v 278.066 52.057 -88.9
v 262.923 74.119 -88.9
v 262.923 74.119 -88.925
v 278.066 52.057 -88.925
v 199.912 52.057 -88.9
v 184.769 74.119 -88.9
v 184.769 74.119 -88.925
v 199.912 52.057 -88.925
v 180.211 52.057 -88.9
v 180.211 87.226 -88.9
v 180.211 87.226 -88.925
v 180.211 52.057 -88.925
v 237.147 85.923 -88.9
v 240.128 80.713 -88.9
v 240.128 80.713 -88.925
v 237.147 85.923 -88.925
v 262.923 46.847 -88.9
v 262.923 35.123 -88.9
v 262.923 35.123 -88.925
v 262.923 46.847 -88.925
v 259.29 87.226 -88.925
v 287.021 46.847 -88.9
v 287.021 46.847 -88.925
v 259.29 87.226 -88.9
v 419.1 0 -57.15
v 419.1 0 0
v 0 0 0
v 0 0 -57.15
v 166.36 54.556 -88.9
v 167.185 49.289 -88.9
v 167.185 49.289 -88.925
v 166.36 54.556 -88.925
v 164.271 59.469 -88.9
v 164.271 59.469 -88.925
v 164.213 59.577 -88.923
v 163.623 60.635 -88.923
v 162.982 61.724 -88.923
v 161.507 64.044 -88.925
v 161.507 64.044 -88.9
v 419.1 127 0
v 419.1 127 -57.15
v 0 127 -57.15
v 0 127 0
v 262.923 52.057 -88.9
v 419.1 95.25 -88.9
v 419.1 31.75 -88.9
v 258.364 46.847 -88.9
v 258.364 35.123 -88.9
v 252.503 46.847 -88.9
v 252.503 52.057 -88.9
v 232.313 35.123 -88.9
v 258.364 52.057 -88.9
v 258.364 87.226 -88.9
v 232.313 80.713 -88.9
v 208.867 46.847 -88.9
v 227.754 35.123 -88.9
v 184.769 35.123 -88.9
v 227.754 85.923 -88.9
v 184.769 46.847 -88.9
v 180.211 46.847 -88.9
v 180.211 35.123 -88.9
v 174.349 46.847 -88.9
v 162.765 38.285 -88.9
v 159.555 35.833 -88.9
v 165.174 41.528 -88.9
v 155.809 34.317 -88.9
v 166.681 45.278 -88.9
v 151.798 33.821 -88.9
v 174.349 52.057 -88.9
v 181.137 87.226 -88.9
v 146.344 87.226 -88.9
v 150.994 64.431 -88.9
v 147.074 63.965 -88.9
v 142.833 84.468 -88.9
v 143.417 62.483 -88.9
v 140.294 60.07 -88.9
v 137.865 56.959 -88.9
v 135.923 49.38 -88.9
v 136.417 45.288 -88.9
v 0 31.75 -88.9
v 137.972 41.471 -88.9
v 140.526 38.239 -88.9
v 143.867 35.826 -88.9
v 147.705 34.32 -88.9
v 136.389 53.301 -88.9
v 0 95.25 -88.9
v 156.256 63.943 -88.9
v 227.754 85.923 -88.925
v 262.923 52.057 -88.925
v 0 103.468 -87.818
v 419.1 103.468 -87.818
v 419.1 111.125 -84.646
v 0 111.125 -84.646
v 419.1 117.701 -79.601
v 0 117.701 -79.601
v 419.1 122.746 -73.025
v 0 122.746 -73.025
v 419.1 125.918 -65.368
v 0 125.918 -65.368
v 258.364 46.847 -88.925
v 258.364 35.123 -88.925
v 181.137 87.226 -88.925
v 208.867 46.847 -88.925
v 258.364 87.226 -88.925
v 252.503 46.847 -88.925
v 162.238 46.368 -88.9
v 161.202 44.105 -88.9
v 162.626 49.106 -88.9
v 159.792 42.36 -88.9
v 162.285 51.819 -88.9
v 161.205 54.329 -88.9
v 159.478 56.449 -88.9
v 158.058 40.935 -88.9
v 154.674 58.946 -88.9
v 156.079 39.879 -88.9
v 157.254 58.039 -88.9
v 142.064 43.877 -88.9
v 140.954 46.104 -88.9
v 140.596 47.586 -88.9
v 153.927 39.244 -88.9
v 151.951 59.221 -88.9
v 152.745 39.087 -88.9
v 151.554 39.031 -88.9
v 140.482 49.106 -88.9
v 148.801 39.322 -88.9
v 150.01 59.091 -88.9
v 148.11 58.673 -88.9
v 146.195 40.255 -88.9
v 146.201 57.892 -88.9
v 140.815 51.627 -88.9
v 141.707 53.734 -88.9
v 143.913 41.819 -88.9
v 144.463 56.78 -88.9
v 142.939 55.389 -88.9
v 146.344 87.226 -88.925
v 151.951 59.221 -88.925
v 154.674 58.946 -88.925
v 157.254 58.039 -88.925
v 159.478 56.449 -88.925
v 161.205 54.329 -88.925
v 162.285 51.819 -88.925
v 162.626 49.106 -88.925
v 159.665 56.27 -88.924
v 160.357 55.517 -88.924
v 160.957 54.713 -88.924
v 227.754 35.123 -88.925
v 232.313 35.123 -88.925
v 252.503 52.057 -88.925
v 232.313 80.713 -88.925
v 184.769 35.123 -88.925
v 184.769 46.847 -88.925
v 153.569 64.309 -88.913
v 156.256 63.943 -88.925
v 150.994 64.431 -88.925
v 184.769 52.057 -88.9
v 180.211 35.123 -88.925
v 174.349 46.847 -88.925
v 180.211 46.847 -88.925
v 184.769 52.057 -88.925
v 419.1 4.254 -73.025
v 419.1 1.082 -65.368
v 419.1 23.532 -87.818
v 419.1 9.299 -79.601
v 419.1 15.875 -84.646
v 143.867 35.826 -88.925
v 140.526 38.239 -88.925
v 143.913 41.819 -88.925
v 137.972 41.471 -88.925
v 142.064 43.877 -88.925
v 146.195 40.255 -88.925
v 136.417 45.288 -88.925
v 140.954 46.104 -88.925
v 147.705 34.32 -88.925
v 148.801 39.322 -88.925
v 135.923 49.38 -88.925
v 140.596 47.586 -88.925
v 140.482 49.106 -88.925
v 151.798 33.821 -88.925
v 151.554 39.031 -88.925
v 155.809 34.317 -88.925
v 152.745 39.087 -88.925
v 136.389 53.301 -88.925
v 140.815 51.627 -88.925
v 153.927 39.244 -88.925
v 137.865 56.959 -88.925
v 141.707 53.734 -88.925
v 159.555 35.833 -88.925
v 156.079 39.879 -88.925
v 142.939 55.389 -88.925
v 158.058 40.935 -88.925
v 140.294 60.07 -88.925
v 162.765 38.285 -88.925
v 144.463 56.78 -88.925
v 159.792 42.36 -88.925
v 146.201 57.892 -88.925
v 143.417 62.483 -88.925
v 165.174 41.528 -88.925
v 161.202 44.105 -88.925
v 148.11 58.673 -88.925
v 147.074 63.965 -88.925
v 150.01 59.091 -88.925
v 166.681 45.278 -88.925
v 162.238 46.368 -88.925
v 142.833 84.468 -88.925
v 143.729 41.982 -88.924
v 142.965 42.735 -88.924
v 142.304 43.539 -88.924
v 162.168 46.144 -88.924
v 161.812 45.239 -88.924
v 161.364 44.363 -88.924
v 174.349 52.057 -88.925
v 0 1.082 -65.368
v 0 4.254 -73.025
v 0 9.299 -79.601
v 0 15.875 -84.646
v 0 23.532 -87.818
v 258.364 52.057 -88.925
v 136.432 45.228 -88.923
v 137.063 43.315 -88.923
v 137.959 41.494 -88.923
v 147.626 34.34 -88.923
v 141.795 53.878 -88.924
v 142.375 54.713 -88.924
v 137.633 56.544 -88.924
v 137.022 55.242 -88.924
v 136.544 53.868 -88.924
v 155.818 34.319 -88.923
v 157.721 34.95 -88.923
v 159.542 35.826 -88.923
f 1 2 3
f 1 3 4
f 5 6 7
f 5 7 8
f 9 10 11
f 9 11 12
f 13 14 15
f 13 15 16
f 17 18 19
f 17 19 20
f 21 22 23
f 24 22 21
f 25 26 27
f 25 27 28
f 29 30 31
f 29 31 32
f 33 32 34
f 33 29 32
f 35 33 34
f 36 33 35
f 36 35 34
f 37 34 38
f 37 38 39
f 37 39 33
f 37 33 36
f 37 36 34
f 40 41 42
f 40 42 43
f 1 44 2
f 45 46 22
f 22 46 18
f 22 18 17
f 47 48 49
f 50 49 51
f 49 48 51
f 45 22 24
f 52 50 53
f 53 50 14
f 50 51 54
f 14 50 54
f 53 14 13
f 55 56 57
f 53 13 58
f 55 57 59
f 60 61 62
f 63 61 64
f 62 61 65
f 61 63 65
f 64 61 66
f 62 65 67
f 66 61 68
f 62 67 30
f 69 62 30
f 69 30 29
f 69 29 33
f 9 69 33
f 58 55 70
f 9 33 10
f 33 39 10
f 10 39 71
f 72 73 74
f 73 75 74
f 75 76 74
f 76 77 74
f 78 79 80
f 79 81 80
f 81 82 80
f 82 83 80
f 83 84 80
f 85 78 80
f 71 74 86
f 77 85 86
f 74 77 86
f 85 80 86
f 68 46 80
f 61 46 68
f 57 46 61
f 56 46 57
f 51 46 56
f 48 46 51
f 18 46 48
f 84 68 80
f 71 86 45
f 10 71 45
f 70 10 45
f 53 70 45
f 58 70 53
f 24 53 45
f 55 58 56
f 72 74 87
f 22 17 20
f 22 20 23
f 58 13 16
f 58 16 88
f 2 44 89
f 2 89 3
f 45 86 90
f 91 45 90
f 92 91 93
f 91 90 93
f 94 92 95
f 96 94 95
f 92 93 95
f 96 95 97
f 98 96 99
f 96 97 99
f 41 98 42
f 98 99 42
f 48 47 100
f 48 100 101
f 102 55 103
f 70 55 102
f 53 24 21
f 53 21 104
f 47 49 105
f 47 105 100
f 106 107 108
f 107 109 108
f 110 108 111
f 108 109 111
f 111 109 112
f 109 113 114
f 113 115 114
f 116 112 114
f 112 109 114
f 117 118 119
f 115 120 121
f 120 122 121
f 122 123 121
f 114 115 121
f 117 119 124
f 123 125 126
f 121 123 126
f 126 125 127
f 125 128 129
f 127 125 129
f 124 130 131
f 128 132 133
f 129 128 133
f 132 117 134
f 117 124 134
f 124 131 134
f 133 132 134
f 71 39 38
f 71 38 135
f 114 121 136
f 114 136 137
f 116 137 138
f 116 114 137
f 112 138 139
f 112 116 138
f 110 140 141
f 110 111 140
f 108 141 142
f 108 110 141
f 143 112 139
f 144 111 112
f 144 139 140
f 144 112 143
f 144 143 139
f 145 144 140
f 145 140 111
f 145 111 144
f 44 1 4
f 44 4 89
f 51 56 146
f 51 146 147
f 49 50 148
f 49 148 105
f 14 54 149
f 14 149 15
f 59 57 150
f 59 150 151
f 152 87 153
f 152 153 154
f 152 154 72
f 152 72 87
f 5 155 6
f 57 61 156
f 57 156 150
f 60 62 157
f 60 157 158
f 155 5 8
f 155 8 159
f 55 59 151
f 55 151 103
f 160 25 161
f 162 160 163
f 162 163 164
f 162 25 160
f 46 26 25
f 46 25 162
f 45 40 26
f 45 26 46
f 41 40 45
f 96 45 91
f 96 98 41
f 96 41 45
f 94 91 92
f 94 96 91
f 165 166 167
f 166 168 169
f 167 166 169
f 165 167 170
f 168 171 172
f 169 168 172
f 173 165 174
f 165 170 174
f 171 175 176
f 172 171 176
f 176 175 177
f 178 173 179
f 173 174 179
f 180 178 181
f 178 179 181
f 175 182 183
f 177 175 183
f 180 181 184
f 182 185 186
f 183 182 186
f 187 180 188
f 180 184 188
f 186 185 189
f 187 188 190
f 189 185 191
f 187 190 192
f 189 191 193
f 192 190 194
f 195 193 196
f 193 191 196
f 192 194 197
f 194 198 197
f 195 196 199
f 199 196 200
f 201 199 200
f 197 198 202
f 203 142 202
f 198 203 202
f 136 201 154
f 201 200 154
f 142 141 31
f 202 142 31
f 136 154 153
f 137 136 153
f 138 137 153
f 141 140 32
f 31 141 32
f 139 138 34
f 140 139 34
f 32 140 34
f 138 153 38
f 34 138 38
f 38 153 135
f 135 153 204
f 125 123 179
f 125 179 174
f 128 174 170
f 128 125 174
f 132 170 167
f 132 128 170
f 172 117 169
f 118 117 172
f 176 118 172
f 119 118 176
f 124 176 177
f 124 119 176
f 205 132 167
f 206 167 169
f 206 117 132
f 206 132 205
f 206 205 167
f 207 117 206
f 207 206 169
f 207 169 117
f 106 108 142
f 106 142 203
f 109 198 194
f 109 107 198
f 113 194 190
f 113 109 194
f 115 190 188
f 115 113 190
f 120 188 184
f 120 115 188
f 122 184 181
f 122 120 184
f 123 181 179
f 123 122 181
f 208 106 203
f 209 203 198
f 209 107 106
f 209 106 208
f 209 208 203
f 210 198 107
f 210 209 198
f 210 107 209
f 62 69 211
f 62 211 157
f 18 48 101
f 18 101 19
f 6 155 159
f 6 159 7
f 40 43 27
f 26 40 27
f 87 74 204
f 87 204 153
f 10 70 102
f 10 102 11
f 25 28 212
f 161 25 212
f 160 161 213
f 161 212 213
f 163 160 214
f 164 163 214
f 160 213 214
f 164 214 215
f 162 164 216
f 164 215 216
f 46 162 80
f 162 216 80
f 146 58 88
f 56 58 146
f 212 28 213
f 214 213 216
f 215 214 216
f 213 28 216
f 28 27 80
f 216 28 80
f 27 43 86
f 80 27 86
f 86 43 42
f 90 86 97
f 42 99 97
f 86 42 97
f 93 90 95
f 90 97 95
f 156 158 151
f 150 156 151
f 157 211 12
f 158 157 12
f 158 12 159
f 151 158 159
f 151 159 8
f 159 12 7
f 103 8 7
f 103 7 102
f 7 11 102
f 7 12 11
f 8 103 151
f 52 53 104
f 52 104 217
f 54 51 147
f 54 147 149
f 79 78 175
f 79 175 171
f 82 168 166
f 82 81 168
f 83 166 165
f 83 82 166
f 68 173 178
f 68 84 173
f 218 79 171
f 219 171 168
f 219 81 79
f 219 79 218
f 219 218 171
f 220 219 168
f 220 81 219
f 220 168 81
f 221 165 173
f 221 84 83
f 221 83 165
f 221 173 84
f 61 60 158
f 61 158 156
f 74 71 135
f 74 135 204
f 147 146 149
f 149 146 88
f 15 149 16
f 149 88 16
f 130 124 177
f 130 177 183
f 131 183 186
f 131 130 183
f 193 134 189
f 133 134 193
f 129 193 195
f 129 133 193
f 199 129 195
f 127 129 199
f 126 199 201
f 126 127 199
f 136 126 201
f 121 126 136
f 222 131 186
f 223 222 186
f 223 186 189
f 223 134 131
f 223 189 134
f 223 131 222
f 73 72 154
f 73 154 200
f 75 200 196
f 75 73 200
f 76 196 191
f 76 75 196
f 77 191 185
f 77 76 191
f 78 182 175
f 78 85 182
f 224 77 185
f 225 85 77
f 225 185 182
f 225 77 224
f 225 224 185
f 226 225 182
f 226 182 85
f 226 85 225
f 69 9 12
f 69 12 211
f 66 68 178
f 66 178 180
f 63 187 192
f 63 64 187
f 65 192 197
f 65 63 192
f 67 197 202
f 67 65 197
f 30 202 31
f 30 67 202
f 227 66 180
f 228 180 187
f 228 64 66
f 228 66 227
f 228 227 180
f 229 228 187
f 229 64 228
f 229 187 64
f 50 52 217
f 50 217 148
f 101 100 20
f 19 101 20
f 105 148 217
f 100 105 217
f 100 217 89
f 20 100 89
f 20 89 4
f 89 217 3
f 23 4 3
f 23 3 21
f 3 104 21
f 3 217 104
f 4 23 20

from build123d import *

# Parameters (mm, degrees)
BOSS_EXTRUDE1_DEPTH = 419.1
BOSS_EXTRUDE2_DEPTH = 0.0254


with BuildPart() as part:
    # Sketch1 → Boss-Extrude1 (new body)
    with BuildSketch(Plane(origin=(0, 0, 0), x_dir=(0, 0, -1), z_dir=(1, 0, 0))):
        with BuildLine():
            Line((0, 0), (57.15, 0))
            ThreePointArc((57.15, 0), (79.600640303, 9.299359697), (88.9, 31.75))
            Line((88.9, 31.75), (88.9, 95.25))
            ThreePointArc((88.9, 95.25), (79.600640303, 117.700640303), (57.15, 127))
            Line((57.15, 127), (0, 127))
            Line((0, 127), (0, 0))
        make_face()
    extrude(amount=BOSS_EXTRUDE1_DEPTH)

    # Sketch2 → Boss-Extrude2 (add)
    # profile 1 of 4: a face of its own
    with BuildSketch(Plane(origin=(0, 0, -88.9), x_dir=(-1, 0, 0), z_dir=(0, 0, -1))):
        Polygon((-259.290402428, 87.225987453), (-258.364360761, 87.225987453), (-258.364360761, 52.056756684), (-252.5028223, 52.056756684), (-252.5028223, 46.846500274), (-258.364360761, 46.846500274), (-258.364360761, 35.123423351), (-262.92333512, 35.123423351), (-262.92333512, 46.846500274), (-287.020771018, 46.846500274), align=None)
        Polygon((-262.92333512, 52.056756684), (-262.92333512, 74.118936171), (-278.065642812, 52.056756684), align=None, mode=Mode.SUBTRACT)
    # profile 2 of 4: a face of its own
    with BuildSketch(Plane(origin=(0, 0, -88.9), x_dir=(-1, 0, 0), z_dir=(0, 0, -1))):
        Polygon((-237.146812684, 85.923423351), (-227.754104351, 85.923423351), (-227.754104351, 35.123423351), (-232.31307871, 35.123423351), (-232.31307871, 80.71316694), (-240.128463325, 80.71316694), align=None)
    # profile 3 of 4: a face of its own
    with BuildSketch(Plane(origin=(0, 0, -88.9), x_dir=(-1, 0, 0), z_dir=(0, 0, -1))):
        Polygon((-181.136556274, 87.225987453), (-180.210514607, 87.225987453), (-180.210514607, 52.056756684), (-174.348976146, 52.056756684), (-174.348976146, 46.846500274), (-180.210514607, 46.846500274), (-180.210514607, 35.123423351), (-184.769488966, 35.123423351), (-184.769488966, 46.846500274), (-208.866924864, 46.846500274), align=None)
        Polygon((-184.769488966, 52.056756684), (-184.769488966, 74.118936171), (-199.911796659, 52.056756684), align=None, mode=Mode.SUBTRACT)
    # profile 4 of 4: a face of its own
    with BuildSketch(Plane(origin=(0, 0, -88.9), x_dir=(-1, 0, 0), z_dir=(0, 0, -1))):
        with BuildLine():
            Line((-146.343847941, 87.225987453), (-142.833030633, 84.468215017))
            Line((-142.833030633, 84.468215017), (-156.255546659, 63.94265412))
            add(Edge.make_bspline(
                [(-156.255546659, 63.94265412), (-155.361898067, 64.085095297), (-153.618735447, 64.362942919), (-151.854293263, 64.408778242), (-150.994408838, 64.431115658)],
                knots=[0, 0, 0, 0, 1.025318673, 2, 2, 2, 2], degree=3))
            add(Edge.make_bspline(
                [(-150.994408838, 64.431115658), (-150.478099463, 64.41723838), (-149.461759822, 64.38992137), (-147.969592522, 64.179698623), (-146.53574168, 63.848408427), (-145.166150279, 63.365485398), (-143.855902428, 62.748594083), (-142.597479079, 62.009252766), (-141.414535618, 61.109284606), (-140.291838502, 60.103953247), (-139.272542346, 58.990461015), (-138.370101311, 57.808978757), (-137.612066734, 56.560737398), (-136.997039528, 55.246369173), (-136.519448719, 53.867900148), (-136.171285185, 52.427094009), (-135.965478524, 50.922957224), (-135.937531401, 49.900016851), (-135.92333512, 49.380394504)],
                knots=[0, 0, 0, 0, 1.04369286, 2.054478336, 3.041073146, 4.015093852, 4.984733326, 5.965804835, 6.960378782, 7.985147595, 9.009457201, 10.008161701, 10.986880575, 11.956520048, 12.937015923, 13.931873656, 14.949455224, 16, 16, 16, 16], degree=3))
            add(Edge.make_bspline(
                [(-135.92333512, 49.380394504), (-135.943990471, 48.669489087), (-135.984635313, 47.270595467), (-136.389638981, 45.233127843), (-137.018973254, 43.292095903), (-137.918532809, 41.478489873), (-139.03587711, 39.794795434), (-140.398443313, 38.302937822), (-141.9579088, 36.972412709), (-143.7212029, 35.859796636), (-145.618843636, 34.951158067), (-147.61240977, 34.298519696), (-149.682540922, 33.896713912), (-151.087590662, 33.846340593), (-151.79833512, 33.820859248)],
                knots=[0, 0, 0, 0, 1.031375318, 2.029502543, 3.004789286, 3.987476834, 4.960371455, 5.9300674, 6.912260825, 7.929083631, 8.949397511, 9.960523116, 10.96833055, 12, 12, 12, 12], degree=3))
            add(Edge.make_bspline(
                [(-151.79833512, 33.820859248), (-152.48191009, 33.843040063), (-153.83595242, 33.886976373), (-155.827788404, 34.2783677), (-157.741685913, 34.912745078), (-159.564235785, 35.78671232), (-161.252546395, 36.890638164), (-162.762984775, 38.219599244), (-164.088019675, 39.745188052), (-165.19073703, 41.467167949), (-166.065349482, 43.317593618), (-166.721248967, 45.247081488), (-167.104371583, 47.248601223), (-167.157908351, 48.605413186), (-167.184873582, 49.288807966)],
                knots=[0, 0, 0, 0, 1.012016664, 2.004627821, 2.994792927, 3.992885782, 4.990978636, 5.973936114, 6.964471063, 7.975201453, 8.993600317, 9.990122807, 10.98767138, 12, 12, 12, 12], degree=3))
            add(Edge.make_bspline(
                [(-167.184873582, 49.288807966), (-167.167725751, 49.811969345), (-167.132713158, 50.880164923), (-166.888243378, 52.497985671), (-166.495417214, 54.153355657), (-166.055485638, 55.557673667), (-165.590656784, 56.708098043), (-165.203814209, 57.635611564), (-164.722317353, 58.59008657), (-164.208897991, 59.604252486), (-163.617341151, 60.651972481), (-162.974131154, 61.750757169), (-162.261484792, 62.883131662), (-161.761900716, 63.651578839), (-161.506508197, 64.04441694)],
                knots=[0, 0, 0, 0, 1.173818275, 2.396712641, 3.66331629, 4.989737886, 5.693666774, 6.447286557, 7.243889047, 8.091586357, 8.998013824, 9.943181721, 10.948533338, 12, 12, 12, 12], degree=3))
            Line((-161.506508197, 64.04441694), (-146.343847941, 87.225987453))
        make_face()
        with BuildLine():
            add(Edge.make_bspline(
                [(-151.950979351, 59.220859248), (-152.33796279, 59.2095665), (-153.093853864, 59.187508482), (-154.202852912, 59.059416254), (-155.252428104, 58.818202388), (-156.256484787, 58.510988198), (-157.196251446, 58.088578074), (-158.078558036, 57.575471964), (-158.906816503, 56.971370292), (-159.672351483, 56.284831354), (-160.366419739, 55.533165047), (-160.964134437, 54.728064553), (-161.479716702, 53.888932691), (-161.898915673, 53.008758216), (-162.225343058, 52.087877593), (-162.461465099, 51.130526202), (-162.592873831, 50.130284273), (-162.614735706, 49.451995376), (-162.625899223, 49.105634889)],
                knots=[0, 0, 0, 0, 1.129588631, 2.206414736, 3.251139165, 4.268635594, 5.265702196, 6.250456724, 7.242448911, 8.251968645, 9.246821453, 10.222880186, 11.173611482, 12.116736599, 13.062300278, 14.020270554, 14.989073742, 16, 16, 16, 16], degree=3))
            add(Edge.make_bspline(
                [(-162.625899223, 49.105634889), (-162.616808033, 48.762372324), (-162.598981564, 48.089285536), (-162.437113607, 47.097391158), (-162.189861555, 46.142860487), (-161.822063809, 45.230614425), (-161.383342118, 44.346747866), (-160.804144842, 43.523275723), (-160.162369779, 42.71018442), (-159.395232687, 41.969934491), (-158.57193359, 41.281135489), (-157.692350423, 40.679079238), (-156.77562872, 40.164022778), (-155.809392079, 39.760364562), (-154.807349249, 39.429086341), (-153.761151493, 39.195965442), (-152.67007119, 39.064168093), (-151.930975632, 39.04227774), (-151.554104351, 39.031115658)],
                knots=[0, 0, 0, 0, 0.989467248, 1.94019797, 2.891935182, 3.827694429, 4.772920941, 5.730924762, 6.725747692, 7.756678648, 8.79901574, 9.819492441, 10.826891316, 11.826466727, 12.835195252, 13.867842842, 14.912794438, 16, 16, 16, 16], degree=3))
            add(Edge.make_bspline(
                [(-151.554104351, 39.031115658), (-151.177233687, 39.042278616), (-150.43813934, 39.064170685), (-149.34705026, 39.195955593), (-148.30088495, 39.429122483), (-147.298724196, 39.760233548), (-146.332922854, 40.164508796), (-145.417002896, 40.675874945), (-144.545737995, 41.284838026), (-143.721898436, 41.968757384), (-142.957954417, 42.714397635), (-142.300787055, 43.516017606), (-141.739327555, 44.353403287), (-141.283082783, 45.22713266), (-140.919336041, 46.143412081), (-140.670830174, 47.097243388), (-140.509296495, 48.089324222), (-140.491424093, 48.76238539), (-140.482309479, 49.105634889)],
                knots=[0, 0, 0, 0, 1.087397944, 2.132534446, 3.165364764, 4.174271784, 5.174024072, 6.181601208, 7.194203697, 8.236725232, 9.267838612, 10.269026844, 11.221737037, 12.171628256, 13.107553087, 14.05945871, 15.010357665, 16, 16, 16, 16], degree=3))
            add(Edge.make_bspline(
                [(-140.482309479, 49.105634889), (-140.490296589, 49.452447228), (-140.505972688, 50.13312706), (-140.683278456, 51.130078776), (-140.929184911, 52.092741769), (-141.300504328, 53.01506583), (-141.782909034, 53.893411288), (-142.370496771, 54.732215095), (-143.050238077, 55.537908136), (-143.835425223, 56.286305469), (-144.690174904, 56.970611629), (-145.598995401, 57.574689762), (-146.549796847, 58.084503709), (-147.541615212, 58.509875365), (-148.585814766, 58.816844875), (-149.665537403, 59.058554803), (-150.794592696, 59.18718066), (-151.560607469, 59.209490063), (-151.950979351, 59.220859248)],
                knots=[0, 0, 0, 0, 0.978206639, 1.919901502, 2.851605144, 3.780102724, 4.718870031, 5.675451981, 6.667674623, 7.690630536, 8.733308323, 9.756129687, 10.767539656, 11.776269907, 12.797430371, 13.836405707, 14.897401972, 16, 16, 16, 16], degree=3))
        make_face(mode=Mode.SUBTRACT)
    extrude(amount=BOSS_EXTRUDE2_DEPTH)


solid = part.part
